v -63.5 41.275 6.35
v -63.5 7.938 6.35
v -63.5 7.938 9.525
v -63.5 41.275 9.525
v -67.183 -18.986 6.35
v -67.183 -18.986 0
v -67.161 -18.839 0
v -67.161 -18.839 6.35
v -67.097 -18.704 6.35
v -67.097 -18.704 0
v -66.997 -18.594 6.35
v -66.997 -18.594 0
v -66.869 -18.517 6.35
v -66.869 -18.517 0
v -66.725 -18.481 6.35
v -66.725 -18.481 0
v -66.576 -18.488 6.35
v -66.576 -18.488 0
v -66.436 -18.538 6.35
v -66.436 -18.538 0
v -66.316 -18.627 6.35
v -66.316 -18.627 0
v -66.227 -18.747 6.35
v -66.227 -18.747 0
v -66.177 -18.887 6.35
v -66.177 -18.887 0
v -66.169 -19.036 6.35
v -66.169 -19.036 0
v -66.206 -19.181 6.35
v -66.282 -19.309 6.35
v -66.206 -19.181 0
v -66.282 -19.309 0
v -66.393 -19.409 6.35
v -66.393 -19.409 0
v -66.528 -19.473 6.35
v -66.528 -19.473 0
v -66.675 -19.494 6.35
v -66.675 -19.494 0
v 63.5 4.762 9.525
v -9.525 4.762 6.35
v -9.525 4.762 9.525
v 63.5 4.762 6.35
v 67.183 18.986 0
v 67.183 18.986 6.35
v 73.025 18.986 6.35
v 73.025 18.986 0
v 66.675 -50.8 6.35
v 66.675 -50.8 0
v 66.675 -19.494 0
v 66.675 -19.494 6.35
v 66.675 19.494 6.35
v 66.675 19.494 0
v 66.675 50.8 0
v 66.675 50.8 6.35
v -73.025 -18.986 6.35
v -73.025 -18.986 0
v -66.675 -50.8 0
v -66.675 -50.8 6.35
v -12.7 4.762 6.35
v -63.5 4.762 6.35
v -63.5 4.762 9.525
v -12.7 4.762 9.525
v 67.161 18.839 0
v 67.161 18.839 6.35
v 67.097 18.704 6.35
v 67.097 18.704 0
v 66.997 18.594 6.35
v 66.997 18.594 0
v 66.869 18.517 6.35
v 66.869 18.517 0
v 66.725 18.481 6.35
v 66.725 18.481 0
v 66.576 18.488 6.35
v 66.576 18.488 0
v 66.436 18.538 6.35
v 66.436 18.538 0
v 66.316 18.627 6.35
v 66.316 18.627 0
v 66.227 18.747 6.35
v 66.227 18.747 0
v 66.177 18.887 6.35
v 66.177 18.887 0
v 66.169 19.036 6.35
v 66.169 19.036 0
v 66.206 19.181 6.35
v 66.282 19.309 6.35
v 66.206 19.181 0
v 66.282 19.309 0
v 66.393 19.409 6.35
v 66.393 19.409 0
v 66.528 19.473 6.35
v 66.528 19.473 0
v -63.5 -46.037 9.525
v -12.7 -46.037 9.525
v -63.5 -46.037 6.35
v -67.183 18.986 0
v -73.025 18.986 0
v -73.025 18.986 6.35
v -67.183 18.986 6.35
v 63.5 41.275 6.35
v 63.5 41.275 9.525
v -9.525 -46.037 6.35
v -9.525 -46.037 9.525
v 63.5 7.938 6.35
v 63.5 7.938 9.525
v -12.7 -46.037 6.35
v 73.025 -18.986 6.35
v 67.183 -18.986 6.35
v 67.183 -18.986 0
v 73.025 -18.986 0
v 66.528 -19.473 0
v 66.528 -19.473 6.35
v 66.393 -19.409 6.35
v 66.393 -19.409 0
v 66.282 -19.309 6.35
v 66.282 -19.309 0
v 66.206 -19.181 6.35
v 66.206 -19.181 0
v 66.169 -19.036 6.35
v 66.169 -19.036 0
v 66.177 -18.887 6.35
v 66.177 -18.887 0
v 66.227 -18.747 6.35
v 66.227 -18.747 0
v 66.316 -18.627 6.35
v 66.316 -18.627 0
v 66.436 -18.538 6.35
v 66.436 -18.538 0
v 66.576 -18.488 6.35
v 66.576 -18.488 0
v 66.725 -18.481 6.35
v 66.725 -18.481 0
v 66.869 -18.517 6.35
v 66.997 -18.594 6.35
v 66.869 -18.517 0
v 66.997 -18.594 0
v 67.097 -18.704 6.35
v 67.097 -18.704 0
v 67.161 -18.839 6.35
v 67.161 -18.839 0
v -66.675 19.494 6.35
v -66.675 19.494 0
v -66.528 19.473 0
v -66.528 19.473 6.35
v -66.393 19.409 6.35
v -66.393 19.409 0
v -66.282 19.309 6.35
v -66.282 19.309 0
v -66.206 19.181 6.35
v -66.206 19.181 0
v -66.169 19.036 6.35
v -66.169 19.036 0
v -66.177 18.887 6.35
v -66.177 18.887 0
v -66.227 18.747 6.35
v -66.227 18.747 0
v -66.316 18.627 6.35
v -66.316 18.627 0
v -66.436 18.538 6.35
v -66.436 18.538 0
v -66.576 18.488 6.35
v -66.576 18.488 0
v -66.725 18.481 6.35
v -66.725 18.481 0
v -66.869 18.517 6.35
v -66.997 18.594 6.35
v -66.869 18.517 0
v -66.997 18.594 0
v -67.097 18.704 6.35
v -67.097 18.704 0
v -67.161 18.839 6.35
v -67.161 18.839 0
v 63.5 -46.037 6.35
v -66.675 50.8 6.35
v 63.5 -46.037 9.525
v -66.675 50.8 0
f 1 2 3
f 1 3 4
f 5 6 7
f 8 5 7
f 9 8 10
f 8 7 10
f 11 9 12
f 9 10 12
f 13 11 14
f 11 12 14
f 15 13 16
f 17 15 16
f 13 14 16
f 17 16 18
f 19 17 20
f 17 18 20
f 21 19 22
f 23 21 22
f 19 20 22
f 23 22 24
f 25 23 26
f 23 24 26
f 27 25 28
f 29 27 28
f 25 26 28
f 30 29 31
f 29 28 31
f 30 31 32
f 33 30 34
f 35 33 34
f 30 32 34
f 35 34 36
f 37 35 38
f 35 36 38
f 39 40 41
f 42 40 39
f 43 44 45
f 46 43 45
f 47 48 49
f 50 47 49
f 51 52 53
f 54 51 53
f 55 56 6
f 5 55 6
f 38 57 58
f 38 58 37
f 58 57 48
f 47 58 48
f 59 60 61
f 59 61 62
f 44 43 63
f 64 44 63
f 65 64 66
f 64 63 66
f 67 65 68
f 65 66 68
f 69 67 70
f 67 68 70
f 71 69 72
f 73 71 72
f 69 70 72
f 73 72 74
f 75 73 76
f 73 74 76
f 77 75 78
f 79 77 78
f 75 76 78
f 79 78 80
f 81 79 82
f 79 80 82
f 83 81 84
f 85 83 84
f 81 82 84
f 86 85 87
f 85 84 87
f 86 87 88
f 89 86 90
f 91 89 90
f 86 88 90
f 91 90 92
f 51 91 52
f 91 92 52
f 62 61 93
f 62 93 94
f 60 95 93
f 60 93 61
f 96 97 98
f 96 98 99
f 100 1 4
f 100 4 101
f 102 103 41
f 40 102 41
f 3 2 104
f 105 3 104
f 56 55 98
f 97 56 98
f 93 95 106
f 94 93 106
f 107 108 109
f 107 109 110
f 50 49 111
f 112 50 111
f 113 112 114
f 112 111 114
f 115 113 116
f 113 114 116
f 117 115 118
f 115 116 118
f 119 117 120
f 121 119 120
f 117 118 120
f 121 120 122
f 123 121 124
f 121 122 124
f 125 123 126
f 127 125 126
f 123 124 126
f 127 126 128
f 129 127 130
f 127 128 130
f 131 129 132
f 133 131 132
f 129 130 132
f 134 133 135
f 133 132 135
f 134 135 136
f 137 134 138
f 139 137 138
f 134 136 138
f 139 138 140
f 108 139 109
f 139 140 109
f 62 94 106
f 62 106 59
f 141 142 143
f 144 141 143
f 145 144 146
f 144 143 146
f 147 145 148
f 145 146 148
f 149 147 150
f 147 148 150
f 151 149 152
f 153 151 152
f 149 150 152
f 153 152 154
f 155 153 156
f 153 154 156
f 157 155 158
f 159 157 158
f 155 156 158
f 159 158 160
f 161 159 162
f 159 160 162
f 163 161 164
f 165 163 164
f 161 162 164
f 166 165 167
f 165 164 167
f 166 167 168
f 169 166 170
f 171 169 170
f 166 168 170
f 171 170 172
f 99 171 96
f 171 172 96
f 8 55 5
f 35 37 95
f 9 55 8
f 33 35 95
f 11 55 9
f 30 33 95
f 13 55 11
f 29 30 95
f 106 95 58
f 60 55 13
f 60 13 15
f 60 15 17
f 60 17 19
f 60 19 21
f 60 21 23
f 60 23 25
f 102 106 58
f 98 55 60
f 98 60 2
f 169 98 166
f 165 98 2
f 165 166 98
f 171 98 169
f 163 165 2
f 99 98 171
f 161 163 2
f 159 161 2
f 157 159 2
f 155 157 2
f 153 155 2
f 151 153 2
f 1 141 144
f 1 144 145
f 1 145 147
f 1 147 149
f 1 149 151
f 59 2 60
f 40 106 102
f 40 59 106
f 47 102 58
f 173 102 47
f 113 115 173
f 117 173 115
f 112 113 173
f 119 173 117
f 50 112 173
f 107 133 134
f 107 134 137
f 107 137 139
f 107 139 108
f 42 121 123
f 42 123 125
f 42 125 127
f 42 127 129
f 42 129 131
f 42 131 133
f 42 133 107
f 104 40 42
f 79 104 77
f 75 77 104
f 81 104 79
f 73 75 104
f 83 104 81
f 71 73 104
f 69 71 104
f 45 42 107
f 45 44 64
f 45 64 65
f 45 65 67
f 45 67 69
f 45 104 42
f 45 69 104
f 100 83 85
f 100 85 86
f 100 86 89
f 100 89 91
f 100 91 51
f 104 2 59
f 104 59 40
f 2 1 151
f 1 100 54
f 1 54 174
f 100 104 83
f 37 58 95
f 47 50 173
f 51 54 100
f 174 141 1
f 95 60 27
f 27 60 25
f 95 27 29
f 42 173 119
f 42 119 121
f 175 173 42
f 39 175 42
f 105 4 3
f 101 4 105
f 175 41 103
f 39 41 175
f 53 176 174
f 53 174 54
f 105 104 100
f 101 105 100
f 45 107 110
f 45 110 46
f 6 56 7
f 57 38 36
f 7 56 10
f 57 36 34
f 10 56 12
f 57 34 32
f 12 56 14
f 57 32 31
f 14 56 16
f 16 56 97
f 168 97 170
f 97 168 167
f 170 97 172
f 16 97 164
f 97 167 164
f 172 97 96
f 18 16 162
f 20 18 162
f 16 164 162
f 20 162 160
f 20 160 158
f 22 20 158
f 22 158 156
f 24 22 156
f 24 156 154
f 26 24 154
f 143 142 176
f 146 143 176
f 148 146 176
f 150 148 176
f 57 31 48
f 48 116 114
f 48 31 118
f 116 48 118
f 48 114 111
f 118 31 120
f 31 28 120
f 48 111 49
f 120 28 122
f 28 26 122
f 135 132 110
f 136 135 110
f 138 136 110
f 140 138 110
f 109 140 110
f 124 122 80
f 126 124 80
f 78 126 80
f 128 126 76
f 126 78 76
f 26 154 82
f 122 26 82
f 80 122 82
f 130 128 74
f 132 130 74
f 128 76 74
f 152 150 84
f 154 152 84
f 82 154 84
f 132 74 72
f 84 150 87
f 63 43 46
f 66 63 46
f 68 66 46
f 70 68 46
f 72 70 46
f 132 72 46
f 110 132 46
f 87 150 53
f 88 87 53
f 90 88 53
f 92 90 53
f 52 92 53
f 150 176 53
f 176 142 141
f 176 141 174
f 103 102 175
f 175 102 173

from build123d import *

# Parameters (mm, degrees)
F0_W     = 133.35
F0_H     = 101.6
F1_DEPTH = 6.35
F2_W     = 6.35
F2_H     = 37.973
F3_DEPTH = 6.35
F4_W     = 127
F4_H     = 33.3375
F4_H_2   = 50.8
F5_DEPTH = 3.175
F6_W     = 3.175
F6_H     = 50.8
F7_DEPTH = 3.175
F9_DEPTH = 9.526


with BuildPart() as f1:
    # F0 (on Top) → F1 (new body)
    with BuildSketch(Plane.XY):
        Rectangle(F0_W, F0_H)
    extrude(amount=F1_DEPTH)

    # F2 (on face) → F3 (join)
    with BuildSketch(Plane.XY.offset(6.35)):
        with Locations((-69.85, 0)):
            Rectangle(F2_W, F2_H)
        with Locations((69.85, 0)):
            Rectangle(F2_W, F2_H)
    extrude(amount=-F3_DEPTH)

    # F4 (on face) → F5 (join)
    with BuildSketch(Plane.XY.offset(6.35)):
        with Locations((0, 24.60625)):
            Rectangle(F4_W, F4_H)
        with Locations((0, -20.6375)):
            Rectangle(F4_W, F4_H_2)
    extrude(amount=F5_DEPTH)

    # F6 (on face) → F7 (cut)
    with BuildSketch(Plane.XY.offset(9.525)):
        with Locations((-11.1125, -20.6375)):
            Rectangle(F6_W, F6_H)
    extrude(amount=-F7_DEPTH, mode=Mode.SUBTRACT)

    # F8 (on face) → F9 (cut, through all)
    with BuildSketch(Plane(origin=(0, 0, 0), x_dir=(1, 0, 0), z_dir=(0, 0, -1))):
        with BuildLine():
            ThreePointArc((-67.183, 18.9865), (-66.31579, 18.62729), (-66.675, 19.4945))
            Line((-66.675, 19.4945), (-66.675, 18.9865))
            Line((-66.675, 18.9865), (-67.183, 18.9865))
        make_face()
        with BuildLine():
            Line((-66.675, -18.9865), (-66.675, -19.4945))
            ThreePointArc((-66.675, -19.4945), (-66.31579, -18.62729), (-67.183, -18.9865))
            Line((-67.183, -18.9865), (-66.675, -18.9865))
        make_face()
        with BuildLine():
            ThreePointArc((67.183, -18.9865), (66.31579, -18.62729), (66.675, -19.4945))
            Line((66.675, -19.4945), (66.675, -18.9865))
            Line((66.675, -18.9865), (67.183, -18.9865))
        make_face()
        with BuildLine():
            ThreePointArc((66.675, 19.4945), (66.31579, 18.62729), (67.183, 18.9865))
            Line((67.183, 18.9865), (66.675, 18.9865))
            Line((66.675, 18.9865), (66.675, 19.4945))
        make_face()
        with BuildLine():
            Line((66.675, 18.9865), (66.675, 19.4945))
            ThreePointArc((66.675, 19.4945), (66.31579, 18.62729), (67.183, 18.9865))
            Line((67.183, 18.9865), (66.675, 18.9865))
        make_face()
        with BuildLine():
            Line((66.675, -18.9865), (67.183, -18.9865))
            ThreePointArc((67.183, -18.9865), (66.31579, -18.62729), (66.675, -19.4945))
            Line((66.675, -19.4945), (66.675, -18.9865))
        make_face()
        with BuildLine():
            ThreePointArc((-66.675, -19.4945), (-66.31579, -18.62729), (-67.183, -18.9865))
            Line((-67.183, -18.9865), (-66.675, -18.9865))
            Line((-66.675, -18.9865), (-66.675, -19.4945))
        make_face()
    extrude(amount=-F9_DEPTH, mode=Mode.SUBTRACT)


solid = f1.part
